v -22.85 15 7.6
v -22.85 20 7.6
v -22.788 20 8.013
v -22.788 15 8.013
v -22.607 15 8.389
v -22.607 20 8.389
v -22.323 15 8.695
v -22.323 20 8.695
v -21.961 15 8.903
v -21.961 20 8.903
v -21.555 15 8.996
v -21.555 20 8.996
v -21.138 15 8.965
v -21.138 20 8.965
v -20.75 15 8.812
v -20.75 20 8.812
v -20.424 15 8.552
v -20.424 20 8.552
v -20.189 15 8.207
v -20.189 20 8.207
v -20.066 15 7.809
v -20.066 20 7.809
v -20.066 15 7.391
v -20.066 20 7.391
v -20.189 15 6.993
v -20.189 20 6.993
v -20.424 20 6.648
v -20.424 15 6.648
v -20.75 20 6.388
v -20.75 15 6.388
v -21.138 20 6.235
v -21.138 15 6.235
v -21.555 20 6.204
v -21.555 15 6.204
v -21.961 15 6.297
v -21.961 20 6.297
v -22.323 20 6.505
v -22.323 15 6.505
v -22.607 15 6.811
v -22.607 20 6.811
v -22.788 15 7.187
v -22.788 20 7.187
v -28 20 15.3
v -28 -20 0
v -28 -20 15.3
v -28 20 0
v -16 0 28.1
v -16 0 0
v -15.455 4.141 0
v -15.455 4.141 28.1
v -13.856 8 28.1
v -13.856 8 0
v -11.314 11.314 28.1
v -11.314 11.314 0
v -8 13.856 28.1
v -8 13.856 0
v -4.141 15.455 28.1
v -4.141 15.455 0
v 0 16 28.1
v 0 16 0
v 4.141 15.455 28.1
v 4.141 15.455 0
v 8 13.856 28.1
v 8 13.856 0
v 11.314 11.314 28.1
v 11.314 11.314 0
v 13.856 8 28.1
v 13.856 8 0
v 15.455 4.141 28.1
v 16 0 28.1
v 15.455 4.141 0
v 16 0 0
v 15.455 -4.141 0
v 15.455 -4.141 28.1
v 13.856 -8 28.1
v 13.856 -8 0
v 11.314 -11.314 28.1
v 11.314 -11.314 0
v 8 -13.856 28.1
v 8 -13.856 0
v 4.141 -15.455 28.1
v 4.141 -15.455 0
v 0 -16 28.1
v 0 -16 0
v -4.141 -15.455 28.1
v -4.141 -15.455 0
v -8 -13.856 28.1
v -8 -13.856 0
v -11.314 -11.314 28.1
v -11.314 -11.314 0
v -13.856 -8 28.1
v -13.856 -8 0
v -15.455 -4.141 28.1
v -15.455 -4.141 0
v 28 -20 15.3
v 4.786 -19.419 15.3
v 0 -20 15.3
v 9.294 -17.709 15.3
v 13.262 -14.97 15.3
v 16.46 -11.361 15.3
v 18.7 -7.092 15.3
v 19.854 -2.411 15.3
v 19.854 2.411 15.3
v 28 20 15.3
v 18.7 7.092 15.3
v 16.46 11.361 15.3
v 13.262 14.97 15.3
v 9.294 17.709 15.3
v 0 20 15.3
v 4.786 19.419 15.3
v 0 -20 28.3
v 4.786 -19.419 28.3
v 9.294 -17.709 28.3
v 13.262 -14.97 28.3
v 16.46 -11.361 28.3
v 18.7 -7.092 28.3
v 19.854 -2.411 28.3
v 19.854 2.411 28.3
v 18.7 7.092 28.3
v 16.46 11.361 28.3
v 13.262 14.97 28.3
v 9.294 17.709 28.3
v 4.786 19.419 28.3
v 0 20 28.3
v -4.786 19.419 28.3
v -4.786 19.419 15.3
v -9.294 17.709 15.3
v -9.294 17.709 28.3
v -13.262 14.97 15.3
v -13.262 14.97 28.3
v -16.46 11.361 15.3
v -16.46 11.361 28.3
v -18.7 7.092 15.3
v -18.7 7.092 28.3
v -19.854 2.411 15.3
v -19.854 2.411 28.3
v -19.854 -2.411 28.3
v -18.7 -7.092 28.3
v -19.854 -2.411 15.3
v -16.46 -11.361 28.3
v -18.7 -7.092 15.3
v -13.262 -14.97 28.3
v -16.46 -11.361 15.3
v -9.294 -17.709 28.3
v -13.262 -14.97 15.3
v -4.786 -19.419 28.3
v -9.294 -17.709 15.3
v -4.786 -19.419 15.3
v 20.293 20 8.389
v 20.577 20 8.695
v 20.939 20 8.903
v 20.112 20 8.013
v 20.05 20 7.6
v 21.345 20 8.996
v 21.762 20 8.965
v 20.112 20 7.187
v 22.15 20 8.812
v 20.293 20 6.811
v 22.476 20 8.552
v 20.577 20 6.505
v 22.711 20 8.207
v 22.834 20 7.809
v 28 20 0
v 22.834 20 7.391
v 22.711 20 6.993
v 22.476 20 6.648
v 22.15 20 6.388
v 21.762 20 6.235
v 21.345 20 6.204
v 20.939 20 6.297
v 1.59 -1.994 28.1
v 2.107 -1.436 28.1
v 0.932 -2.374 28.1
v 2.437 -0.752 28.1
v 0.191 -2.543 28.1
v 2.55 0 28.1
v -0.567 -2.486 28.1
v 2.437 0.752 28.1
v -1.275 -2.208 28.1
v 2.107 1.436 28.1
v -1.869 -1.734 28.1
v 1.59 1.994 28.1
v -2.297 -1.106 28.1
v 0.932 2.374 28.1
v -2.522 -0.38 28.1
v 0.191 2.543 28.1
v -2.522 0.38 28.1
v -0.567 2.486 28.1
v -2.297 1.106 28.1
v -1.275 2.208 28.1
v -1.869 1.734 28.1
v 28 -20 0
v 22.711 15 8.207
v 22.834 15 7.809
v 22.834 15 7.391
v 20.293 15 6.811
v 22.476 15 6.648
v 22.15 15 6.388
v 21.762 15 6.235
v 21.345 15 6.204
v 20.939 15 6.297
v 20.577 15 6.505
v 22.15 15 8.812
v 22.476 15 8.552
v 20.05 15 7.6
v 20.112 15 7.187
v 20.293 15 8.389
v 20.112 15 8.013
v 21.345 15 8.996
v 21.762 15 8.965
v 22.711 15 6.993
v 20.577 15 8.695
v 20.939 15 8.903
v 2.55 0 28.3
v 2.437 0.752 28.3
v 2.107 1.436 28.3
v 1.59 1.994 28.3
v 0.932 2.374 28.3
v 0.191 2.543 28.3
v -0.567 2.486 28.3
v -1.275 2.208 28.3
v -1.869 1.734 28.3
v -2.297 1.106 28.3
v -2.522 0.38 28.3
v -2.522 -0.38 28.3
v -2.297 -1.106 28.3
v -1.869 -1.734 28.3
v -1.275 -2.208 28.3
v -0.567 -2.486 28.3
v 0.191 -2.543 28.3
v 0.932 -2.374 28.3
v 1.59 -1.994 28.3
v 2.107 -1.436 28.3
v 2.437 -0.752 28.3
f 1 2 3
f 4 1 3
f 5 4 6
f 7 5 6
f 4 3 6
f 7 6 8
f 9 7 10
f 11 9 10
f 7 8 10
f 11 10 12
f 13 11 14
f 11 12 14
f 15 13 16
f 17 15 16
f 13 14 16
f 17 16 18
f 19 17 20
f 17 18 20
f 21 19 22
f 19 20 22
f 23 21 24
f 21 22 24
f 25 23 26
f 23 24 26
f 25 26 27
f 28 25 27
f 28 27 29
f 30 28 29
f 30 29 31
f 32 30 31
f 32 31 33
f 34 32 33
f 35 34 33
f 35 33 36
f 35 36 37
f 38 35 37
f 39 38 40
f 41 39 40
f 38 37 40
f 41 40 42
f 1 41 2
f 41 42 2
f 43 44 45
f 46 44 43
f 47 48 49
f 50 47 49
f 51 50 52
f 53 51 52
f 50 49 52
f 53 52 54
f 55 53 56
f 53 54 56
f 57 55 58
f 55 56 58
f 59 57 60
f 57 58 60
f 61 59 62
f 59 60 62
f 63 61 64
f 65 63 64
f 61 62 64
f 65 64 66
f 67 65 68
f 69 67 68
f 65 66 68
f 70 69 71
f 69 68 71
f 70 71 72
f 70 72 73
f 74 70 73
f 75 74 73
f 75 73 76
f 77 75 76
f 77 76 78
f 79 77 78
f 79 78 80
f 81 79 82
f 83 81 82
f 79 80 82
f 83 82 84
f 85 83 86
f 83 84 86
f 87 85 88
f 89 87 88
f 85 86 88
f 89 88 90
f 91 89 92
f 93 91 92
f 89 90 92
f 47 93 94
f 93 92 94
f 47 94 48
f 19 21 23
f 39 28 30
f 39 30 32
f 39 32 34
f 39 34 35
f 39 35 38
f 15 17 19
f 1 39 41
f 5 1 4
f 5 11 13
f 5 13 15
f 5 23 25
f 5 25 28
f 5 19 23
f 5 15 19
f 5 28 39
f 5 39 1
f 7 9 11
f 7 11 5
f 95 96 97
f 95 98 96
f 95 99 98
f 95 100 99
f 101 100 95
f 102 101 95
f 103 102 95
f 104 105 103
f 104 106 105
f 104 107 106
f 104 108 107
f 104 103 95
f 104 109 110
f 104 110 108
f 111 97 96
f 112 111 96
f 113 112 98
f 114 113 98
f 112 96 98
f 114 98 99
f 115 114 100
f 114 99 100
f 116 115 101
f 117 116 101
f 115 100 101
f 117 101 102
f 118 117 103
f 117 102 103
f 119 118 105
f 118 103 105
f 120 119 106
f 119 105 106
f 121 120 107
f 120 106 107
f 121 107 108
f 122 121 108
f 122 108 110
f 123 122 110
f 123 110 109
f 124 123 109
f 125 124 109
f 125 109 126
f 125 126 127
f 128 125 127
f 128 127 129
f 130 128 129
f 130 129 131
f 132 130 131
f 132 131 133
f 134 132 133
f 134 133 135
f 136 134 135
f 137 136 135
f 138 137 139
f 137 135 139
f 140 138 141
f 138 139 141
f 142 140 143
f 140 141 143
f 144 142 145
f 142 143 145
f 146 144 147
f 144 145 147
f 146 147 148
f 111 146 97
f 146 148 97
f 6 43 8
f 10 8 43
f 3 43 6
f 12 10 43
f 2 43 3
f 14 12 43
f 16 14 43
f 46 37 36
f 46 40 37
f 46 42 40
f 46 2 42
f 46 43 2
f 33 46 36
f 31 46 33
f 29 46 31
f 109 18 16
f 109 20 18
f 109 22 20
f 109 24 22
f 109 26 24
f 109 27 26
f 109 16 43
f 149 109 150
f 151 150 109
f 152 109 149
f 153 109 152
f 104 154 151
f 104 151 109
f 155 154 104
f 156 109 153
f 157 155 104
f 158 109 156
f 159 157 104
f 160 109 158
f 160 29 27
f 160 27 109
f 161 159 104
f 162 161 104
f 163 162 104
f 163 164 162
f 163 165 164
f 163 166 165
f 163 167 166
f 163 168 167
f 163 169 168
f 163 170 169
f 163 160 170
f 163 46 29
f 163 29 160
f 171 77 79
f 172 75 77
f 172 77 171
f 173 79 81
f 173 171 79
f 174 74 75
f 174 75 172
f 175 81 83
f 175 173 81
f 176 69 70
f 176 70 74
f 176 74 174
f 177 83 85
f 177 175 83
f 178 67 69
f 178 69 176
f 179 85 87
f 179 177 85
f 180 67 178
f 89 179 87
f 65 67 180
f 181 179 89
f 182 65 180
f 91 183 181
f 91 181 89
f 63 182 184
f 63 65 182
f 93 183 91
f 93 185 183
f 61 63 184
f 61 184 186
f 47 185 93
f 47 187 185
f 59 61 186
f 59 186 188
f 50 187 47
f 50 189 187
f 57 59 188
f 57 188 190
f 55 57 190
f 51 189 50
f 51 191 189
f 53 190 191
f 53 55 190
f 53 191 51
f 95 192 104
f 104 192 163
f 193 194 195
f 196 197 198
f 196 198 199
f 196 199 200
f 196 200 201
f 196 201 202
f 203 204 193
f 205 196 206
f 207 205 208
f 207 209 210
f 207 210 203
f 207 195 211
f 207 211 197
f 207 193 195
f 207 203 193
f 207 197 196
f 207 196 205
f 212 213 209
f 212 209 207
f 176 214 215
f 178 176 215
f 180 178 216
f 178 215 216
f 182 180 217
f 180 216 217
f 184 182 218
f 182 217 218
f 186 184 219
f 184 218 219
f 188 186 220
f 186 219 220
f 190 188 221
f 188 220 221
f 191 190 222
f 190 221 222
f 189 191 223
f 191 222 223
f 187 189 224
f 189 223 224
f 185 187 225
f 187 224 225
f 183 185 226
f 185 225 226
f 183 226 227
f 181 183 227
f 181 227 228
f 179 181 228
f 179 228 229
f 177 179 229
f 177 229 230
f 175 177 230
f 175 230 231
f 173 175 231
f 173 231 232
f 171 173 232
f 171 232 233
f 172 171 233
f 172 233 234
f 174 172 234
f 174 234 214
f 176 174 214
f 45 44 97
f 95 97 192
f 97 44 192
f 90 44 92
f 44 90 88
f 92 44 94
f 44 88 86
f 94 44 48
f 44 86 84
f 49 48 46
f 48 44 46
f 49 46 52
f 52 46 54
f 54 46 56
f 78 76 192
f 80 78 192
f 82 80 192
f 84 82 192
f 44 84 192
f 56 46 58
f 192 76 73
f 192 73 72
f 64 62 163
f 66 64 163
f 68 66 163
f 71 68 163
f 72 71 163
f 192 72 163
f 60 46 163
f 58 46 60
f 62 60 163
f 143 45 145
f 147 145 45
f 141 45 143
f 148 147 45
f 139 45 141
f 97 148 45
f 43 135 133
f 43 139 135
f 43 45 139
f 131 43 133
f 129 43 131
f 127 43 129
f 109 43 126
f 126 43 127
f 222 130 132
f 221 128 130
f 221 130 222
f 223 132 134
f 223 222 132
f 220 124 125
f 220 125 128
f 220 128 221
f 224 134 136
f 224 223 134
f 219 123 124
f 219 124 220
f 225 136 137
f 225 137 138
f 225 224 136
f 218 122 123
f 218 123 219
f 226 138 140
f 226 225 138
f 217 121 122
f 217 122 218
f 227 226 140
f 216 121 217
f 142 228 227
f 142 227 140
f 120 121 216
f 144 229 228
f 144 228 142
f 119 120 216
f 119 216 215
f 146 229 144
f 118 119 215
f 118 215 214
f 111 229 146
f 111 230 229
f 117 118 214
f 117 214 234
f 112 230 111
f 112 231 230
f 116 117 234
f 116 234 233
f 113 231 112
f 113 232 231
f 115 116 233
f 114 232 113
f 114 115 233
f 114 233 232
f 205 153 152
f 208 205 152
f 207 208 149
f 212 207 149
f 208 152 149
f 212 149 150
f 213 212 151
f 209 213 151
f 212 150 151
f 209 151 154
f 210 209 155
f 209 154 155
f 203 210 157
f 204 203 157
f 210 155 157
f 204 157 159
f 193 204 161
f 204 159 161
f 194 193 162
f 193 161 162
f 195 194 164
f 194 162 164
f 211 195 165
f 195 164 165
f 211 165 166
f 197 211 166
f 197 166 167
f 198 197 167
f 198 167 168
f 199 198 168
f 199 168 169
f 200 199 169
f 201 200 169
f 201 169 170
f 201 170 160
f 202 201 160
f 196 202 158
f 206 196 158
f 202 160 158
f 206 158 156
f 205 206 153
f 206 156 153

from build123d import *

# Parameters (mm, degrees)
ESQUISSE1_W             = 56
ESQUISSE1_H             = 40
BOSS_EXTRU_1_DEPTH      = 15.3
ESQUISSE2_R             = 20
BOSS_EXTRU_2_DEPTH      = 13
ESQUISSE5_R             = 1.4
ENL_V_MAT_EXTRU_1_DEPTH = 5
ESQUISSE6_R             = 16
ENL_V_MAT_EXTRU_2_DEPTH = 28.1
ESQUISSE3_R             = 2.55
ENL_V_MAT_EXTRU_3_DEPTH = 28


with BuildPart() as part:
    # Esquisse1 → Boss.-Extru.1 (new body)
    with BuildSketch(Plane.XY):
        Rectangle(ESQUISSE1_W, ESQUISSE1_H)
    extrude(amount=BOSS_EXTRU_1_DEPTH)

    # Esquisse2 → Boss.-Extru.2 (add)
    with BuildSketch(Plane.XY.offset(15.3)):
        with Locations(Location((0, 0, 0), (0, 0, 270))):
            Circle(ESQUISSE2_R)
    extrude(amount=BOSS_EXTRU_2_DEPTH)

    # Esquisse5 → Enlèv. mat.-Extru.1 (cut)
    with BuildSketch(Plane(origin=(0, 20, 0), x_dir=(1, 0, 0), z_dir=(0, 1, 0))):
        with Locations(Location((-21.45, -7.6, 0), (0, 0, 180))):
            Circle(ESQUISSE5_R)
        with Locations(Location((21.45, -7.6, 0), (0, 0, 180))):
            Circle(ESQUISSE5_R)
    extrude(amount=-ENL_V_MAT_EXTRU_1_DEPTH, mode=Mode.SUBTRACT)

    # Esquisse6 → Enlèv. mat.-Extru.2 (cut)
    with BuildSketch(Plane(origin=(0, 0, 0), x_dir=(-1, 0, 0), z_dir=(0, 0, -1))):
        Circle(ESQUISSE6_R)
    extrude(amount=-ENL_V_MAT_EXTRU_2_DEPTH, mode=Mode.SUBTRACT)

    # Esquisse3 → Enlèv. mat.-Extru.3 (cut)
    with BuildSketch(Plane.XY.offset(28.3)):
        Circle(ESQUISSE3_R)
    extrude(amount=-ENL_V_MAT_EXTRU_3_DEPTH, mode=Mode.SUBTRACT)


solid = part.part
